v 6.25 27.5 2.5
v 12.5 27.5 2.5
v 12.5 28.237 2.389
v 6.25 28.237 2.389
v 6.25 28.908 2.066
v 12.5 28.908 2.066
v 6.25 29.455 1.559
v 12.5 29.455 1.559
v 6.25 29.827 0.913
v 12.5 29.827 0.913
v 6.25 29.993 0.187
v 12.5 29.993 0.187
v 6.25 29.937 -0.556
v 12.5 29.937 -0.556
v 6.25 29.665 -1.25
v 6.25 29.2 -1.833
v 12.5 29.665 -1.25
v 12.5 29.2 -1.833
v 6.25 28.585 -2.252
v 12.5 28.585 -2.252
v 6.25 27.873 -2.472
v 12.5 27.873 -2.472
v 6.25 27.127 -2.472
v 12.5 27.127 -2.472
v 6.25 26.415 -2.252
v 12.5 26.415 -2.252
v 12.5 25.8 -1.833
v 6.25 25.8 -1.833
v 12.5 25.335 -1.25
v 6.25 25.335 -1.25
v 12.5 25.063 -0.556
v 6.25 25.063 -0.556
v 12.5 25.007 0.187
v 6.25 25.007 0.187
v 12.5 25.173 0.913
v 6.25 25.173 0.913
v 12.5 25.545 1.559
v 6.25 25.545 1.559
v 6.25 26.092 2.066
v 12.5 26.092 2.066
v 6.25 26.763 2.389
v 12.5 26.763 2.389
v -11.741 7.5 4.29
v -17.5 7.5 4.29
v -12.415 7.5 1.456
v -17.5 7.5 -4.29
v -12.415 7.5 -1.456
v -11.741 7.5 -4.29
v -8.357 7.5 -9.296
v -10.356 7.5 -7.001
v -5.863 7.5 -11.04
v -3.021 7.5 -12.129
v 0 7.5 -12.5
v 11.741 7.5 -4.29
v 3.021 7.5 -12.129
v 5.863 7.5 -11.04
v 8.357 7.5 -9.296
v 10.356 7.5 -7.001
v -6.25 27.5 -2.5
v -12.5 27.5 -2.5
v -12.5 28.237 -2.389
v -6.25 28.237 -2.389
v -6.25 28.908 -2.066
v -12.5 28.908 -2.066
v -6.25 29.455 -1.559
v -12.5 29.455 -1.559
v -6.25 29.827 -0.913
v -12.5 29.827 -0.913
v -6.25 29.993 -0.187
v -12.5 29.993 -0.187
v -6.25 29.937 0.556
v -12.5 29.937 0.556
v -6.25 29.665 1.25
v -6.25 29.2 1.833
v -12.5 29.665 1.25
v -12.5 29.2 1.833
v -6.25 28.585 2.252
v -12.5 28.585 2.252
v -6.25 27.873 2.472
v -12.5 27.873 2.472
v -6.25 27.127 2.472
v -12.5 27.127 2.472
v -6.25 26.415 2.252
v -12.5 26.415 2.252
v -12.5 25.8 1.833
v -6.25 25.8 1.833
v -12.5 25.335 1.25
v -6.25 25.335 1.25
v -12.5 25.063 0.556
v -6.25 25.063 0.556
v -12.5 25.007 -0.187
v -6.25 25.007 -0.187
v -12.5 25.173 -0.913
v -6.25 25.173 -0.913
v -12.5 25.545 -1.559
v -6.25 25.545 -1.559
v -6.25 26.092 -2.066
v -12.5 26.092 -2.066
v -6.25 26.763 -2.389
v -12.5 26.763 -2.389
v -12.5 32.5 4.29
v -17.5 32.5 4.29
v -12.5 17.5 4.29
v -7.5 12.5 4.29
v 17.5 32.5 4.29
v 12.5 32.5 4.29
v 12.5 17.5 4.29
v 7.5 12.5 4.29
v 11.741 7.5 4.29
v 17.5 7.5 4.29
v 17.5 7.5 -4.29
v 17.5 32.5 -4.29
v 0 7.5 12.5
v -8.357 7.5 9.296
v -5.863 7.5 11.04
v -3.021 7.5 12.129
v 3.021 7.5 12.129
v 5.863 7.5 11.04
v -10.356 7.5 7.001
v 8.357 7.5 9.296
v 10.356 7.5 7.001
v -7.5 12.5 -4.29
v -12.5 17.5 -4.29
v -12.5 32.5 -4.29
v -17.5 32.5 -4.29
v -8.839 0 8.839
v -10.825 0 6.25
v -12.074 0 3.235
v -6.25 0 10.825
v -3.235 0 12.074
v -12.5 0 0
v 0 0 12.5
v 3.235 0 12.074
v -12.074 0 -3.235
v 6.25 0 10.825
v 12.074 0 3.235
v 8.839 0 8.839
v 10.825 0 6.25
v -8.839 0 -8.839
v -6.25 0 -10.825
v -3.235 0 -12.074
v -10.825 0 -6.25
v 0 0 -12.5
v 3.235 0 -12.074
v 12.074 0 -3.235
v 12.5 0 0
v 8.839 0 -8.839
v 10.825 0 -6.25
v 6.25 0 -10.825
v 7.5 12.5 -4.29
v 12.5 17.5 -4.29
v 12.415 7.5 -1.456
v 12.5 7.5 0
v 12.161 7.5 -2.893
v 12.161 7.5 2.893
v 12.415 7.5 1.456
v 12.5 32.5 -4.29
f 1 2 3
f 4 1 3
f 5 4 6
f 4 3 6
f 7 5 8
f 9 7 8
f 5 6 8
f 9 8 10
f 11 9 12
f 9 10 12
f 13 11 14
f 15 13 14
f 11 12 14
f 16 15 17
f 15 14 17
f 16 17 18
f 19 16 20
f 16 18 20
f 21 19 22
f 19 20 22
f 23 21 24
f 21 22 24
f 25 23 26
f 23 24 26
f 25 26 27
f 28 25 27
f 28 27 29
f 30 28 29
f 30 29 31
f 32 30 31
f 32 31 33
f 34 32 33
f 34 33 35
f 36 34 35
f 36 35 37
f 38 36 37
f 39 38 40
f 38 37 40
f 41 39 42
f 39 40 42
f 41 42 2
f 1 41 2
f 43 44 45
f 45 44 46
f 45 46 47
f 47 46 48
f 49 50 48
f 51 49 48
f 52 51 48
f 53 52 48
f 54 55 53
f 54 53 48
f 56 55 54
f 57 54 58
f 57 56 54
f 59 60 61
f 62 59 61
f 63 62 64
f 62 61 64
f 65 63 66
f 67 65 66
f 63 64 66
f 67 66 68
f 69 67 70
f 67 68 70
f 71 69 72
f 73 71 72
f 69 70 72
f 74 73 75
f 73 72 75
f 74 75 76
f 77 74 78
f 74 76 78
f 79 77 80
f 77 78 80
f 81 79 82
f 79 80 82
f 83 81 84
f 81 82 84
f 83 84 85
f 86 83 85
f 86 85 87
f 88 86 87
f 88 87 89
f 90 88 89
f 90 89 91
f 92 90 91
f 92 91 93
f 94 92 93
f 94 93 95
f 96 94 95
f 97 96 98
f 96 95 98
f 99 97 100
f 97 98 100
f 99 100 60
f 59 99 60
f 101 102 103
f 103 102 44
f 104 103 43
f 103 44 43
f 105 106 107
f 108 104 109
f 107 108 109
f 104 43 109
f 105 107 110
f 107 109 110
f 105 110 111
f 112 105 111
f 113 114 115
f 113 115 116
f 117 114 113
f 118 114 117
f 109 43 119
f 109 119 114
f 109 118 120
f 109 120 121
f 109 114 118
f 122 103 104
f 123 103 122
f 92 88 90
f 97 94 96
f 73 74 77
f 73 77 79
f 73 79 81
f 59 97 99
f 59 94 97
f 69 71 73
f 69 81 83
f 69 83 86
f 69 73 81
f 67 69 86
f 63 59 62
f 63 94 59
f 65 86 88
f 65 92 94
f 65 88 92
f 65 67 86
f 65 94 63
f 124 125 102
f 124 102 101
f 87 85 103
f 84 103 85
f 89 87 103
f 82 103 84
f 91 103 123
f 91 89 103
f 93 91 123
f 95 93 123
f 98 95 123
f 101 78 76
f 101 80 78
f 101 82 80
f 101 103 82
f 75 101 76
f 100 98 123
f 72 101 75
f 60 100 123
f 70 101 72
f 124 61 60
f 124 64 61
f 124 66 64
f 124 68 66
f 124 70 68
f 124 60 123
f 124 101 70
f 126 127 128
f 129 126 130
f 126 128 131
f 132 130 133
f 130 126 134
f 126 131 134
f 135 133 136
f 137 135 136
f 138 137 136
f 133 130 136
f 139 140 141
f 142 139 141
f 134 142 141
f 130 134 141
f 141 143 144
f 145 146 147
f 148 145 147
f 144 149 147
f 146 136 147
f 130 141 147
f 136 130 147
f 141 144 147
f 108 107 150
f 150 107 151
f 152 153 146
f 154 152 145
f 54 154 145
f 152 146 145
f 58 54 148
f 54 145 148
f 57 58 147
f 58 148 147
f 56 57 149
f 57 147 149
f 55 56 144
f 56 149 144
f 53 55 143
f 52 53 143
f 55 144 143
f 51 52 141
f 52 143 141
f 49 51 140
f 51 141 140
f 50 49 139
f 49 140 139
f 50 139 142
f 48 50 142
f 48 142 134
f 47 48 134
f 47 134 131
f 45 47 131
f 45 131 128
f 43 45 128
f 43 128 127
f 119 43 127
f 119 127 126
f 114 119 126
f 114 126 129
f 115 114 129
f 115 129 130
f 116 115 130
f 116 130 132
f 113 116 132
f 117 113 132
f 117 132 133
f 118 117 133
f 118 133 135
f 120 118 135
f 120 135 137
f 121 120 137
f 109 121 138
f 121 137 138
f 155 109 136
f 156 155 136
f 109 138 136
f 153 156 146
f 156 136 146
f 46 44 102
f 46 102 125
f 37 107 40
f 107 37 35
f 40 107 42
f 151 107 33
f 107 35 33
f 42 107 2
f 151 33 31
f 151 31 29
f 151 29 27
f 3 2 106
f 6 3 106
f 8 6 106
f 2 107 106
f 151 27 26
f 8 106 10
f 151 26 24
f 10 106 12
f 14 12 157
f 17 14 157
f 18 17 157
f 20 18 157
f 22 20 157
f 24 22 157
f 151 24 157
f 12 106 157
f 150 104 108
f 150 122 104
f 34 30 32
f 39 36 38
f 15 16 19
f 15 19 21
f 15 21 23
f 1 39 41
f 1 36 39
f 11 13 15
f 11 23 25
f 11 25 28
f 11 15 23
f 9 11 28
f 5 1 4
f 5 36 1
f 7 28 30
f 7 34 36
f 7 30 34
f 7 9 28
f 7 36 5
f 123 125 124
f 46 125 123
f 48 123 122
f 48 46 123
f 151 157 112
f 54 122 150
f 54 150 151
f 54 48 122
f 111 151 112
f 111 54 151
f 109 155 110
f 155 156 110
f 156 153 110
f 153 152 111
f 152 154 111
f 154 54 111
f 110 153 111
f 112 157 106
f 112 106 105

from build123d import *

# Parameters (mm, degrees)
SKETCH1_R           = 12.5
BOSS_EXTRUDE1_DEPTH = 7.5
SKETCH2_W           = 35
SKETCH2_H           = 8.580767914
BOSS_EXTRUDE2_DEPTH = 25
SKETCH3_W           = 25
SKETCH3_H           = 8.580767914
CUT_EXTRUDE1_DEPTH  = 20
SKETCH4_R           = 2.5
BOSS_EXTRUDE3_DEPTH = 6.25
SKETCH5_R           = 2.5
BOSS_EXTRUDE4_DEPTH = 6.25
CHAMFER1_SIZE       = 5
CHAMFER2_SIZE       = 5


with BuildPart() as part:
    # Sketch1 → Boss-Extrude1 (new body)
    with BuildSketch(Plane(origin=(0, 0, 0), x_dir=(1, 0, 0), z_dir=(0, 1, 0))):
        Circle(SKETCH1_R)
    extrude(amount=BOSS_EXTRUDE1_DEPTH)

    # Sketch2 → Boss-Extrude2 (add)
    with BuildSketch(Plane(origin=(0, 7.5, 0), x_dir=(1, 0, 0), z_dir=(0, 1, 0))):
        Rectangle(SKETCH2_W, SKETCH2_H)
    extrude(amount=BOSS_EXTRUDE2_DEPTH)

    # Sketch3 → Cut-Extrude1 (cut)
    with BuildSketch(Plane(origin=(0, 32.5, 0), x_dir=(1, 0, 0), z_dir=(0, 1, 0))):
        Rectangle(SKETCH3_W, SKETCH3_H)
    extrude(amount=-CUT_EXTRUDE1_DEPTH, mode=Mode.SUBTRACT)

    # Sketch4 → Boss-Extrude3 (add)
    with BuildSketch(Plane(origin=(-12.5, 0, 0), x_dir=(0, 0, -1), z_dir=(1, 0, 0))):
        with Locations((0, 27.5)):
            Circle(SKETCH4_R)
    extrude(amount=BOSS_EXTRUDE3_DEPTH)

    # Sketch5 → Boss-Extrude4 (add)
    with BuildSketch(Plane.ZY.offset(-12.5)):
        with Locations((0, 27.5)):
            Circle(SKETCH5_R)
    extrude(amount=BOSS_EXTRUDE4_DEPTH)

    # Chamfer1
    chamfer1_edges = [part.edges().sort_by_distance(p)[0] for p in [
        (-12.5, 12.5, 0),
    ]]
    chamfer(chamfer1_edges, length=CHAMFER1_SIZE)

    # Chamfer2
    chamfer2_edges = [part.edges().sort_by_distance(p)[0] for p in [
        (12.5, 12.5, 0),
    ]]
    chamfer(chamfer2_edges, length=CHAMFER2_SIZE)


solid = part.part
